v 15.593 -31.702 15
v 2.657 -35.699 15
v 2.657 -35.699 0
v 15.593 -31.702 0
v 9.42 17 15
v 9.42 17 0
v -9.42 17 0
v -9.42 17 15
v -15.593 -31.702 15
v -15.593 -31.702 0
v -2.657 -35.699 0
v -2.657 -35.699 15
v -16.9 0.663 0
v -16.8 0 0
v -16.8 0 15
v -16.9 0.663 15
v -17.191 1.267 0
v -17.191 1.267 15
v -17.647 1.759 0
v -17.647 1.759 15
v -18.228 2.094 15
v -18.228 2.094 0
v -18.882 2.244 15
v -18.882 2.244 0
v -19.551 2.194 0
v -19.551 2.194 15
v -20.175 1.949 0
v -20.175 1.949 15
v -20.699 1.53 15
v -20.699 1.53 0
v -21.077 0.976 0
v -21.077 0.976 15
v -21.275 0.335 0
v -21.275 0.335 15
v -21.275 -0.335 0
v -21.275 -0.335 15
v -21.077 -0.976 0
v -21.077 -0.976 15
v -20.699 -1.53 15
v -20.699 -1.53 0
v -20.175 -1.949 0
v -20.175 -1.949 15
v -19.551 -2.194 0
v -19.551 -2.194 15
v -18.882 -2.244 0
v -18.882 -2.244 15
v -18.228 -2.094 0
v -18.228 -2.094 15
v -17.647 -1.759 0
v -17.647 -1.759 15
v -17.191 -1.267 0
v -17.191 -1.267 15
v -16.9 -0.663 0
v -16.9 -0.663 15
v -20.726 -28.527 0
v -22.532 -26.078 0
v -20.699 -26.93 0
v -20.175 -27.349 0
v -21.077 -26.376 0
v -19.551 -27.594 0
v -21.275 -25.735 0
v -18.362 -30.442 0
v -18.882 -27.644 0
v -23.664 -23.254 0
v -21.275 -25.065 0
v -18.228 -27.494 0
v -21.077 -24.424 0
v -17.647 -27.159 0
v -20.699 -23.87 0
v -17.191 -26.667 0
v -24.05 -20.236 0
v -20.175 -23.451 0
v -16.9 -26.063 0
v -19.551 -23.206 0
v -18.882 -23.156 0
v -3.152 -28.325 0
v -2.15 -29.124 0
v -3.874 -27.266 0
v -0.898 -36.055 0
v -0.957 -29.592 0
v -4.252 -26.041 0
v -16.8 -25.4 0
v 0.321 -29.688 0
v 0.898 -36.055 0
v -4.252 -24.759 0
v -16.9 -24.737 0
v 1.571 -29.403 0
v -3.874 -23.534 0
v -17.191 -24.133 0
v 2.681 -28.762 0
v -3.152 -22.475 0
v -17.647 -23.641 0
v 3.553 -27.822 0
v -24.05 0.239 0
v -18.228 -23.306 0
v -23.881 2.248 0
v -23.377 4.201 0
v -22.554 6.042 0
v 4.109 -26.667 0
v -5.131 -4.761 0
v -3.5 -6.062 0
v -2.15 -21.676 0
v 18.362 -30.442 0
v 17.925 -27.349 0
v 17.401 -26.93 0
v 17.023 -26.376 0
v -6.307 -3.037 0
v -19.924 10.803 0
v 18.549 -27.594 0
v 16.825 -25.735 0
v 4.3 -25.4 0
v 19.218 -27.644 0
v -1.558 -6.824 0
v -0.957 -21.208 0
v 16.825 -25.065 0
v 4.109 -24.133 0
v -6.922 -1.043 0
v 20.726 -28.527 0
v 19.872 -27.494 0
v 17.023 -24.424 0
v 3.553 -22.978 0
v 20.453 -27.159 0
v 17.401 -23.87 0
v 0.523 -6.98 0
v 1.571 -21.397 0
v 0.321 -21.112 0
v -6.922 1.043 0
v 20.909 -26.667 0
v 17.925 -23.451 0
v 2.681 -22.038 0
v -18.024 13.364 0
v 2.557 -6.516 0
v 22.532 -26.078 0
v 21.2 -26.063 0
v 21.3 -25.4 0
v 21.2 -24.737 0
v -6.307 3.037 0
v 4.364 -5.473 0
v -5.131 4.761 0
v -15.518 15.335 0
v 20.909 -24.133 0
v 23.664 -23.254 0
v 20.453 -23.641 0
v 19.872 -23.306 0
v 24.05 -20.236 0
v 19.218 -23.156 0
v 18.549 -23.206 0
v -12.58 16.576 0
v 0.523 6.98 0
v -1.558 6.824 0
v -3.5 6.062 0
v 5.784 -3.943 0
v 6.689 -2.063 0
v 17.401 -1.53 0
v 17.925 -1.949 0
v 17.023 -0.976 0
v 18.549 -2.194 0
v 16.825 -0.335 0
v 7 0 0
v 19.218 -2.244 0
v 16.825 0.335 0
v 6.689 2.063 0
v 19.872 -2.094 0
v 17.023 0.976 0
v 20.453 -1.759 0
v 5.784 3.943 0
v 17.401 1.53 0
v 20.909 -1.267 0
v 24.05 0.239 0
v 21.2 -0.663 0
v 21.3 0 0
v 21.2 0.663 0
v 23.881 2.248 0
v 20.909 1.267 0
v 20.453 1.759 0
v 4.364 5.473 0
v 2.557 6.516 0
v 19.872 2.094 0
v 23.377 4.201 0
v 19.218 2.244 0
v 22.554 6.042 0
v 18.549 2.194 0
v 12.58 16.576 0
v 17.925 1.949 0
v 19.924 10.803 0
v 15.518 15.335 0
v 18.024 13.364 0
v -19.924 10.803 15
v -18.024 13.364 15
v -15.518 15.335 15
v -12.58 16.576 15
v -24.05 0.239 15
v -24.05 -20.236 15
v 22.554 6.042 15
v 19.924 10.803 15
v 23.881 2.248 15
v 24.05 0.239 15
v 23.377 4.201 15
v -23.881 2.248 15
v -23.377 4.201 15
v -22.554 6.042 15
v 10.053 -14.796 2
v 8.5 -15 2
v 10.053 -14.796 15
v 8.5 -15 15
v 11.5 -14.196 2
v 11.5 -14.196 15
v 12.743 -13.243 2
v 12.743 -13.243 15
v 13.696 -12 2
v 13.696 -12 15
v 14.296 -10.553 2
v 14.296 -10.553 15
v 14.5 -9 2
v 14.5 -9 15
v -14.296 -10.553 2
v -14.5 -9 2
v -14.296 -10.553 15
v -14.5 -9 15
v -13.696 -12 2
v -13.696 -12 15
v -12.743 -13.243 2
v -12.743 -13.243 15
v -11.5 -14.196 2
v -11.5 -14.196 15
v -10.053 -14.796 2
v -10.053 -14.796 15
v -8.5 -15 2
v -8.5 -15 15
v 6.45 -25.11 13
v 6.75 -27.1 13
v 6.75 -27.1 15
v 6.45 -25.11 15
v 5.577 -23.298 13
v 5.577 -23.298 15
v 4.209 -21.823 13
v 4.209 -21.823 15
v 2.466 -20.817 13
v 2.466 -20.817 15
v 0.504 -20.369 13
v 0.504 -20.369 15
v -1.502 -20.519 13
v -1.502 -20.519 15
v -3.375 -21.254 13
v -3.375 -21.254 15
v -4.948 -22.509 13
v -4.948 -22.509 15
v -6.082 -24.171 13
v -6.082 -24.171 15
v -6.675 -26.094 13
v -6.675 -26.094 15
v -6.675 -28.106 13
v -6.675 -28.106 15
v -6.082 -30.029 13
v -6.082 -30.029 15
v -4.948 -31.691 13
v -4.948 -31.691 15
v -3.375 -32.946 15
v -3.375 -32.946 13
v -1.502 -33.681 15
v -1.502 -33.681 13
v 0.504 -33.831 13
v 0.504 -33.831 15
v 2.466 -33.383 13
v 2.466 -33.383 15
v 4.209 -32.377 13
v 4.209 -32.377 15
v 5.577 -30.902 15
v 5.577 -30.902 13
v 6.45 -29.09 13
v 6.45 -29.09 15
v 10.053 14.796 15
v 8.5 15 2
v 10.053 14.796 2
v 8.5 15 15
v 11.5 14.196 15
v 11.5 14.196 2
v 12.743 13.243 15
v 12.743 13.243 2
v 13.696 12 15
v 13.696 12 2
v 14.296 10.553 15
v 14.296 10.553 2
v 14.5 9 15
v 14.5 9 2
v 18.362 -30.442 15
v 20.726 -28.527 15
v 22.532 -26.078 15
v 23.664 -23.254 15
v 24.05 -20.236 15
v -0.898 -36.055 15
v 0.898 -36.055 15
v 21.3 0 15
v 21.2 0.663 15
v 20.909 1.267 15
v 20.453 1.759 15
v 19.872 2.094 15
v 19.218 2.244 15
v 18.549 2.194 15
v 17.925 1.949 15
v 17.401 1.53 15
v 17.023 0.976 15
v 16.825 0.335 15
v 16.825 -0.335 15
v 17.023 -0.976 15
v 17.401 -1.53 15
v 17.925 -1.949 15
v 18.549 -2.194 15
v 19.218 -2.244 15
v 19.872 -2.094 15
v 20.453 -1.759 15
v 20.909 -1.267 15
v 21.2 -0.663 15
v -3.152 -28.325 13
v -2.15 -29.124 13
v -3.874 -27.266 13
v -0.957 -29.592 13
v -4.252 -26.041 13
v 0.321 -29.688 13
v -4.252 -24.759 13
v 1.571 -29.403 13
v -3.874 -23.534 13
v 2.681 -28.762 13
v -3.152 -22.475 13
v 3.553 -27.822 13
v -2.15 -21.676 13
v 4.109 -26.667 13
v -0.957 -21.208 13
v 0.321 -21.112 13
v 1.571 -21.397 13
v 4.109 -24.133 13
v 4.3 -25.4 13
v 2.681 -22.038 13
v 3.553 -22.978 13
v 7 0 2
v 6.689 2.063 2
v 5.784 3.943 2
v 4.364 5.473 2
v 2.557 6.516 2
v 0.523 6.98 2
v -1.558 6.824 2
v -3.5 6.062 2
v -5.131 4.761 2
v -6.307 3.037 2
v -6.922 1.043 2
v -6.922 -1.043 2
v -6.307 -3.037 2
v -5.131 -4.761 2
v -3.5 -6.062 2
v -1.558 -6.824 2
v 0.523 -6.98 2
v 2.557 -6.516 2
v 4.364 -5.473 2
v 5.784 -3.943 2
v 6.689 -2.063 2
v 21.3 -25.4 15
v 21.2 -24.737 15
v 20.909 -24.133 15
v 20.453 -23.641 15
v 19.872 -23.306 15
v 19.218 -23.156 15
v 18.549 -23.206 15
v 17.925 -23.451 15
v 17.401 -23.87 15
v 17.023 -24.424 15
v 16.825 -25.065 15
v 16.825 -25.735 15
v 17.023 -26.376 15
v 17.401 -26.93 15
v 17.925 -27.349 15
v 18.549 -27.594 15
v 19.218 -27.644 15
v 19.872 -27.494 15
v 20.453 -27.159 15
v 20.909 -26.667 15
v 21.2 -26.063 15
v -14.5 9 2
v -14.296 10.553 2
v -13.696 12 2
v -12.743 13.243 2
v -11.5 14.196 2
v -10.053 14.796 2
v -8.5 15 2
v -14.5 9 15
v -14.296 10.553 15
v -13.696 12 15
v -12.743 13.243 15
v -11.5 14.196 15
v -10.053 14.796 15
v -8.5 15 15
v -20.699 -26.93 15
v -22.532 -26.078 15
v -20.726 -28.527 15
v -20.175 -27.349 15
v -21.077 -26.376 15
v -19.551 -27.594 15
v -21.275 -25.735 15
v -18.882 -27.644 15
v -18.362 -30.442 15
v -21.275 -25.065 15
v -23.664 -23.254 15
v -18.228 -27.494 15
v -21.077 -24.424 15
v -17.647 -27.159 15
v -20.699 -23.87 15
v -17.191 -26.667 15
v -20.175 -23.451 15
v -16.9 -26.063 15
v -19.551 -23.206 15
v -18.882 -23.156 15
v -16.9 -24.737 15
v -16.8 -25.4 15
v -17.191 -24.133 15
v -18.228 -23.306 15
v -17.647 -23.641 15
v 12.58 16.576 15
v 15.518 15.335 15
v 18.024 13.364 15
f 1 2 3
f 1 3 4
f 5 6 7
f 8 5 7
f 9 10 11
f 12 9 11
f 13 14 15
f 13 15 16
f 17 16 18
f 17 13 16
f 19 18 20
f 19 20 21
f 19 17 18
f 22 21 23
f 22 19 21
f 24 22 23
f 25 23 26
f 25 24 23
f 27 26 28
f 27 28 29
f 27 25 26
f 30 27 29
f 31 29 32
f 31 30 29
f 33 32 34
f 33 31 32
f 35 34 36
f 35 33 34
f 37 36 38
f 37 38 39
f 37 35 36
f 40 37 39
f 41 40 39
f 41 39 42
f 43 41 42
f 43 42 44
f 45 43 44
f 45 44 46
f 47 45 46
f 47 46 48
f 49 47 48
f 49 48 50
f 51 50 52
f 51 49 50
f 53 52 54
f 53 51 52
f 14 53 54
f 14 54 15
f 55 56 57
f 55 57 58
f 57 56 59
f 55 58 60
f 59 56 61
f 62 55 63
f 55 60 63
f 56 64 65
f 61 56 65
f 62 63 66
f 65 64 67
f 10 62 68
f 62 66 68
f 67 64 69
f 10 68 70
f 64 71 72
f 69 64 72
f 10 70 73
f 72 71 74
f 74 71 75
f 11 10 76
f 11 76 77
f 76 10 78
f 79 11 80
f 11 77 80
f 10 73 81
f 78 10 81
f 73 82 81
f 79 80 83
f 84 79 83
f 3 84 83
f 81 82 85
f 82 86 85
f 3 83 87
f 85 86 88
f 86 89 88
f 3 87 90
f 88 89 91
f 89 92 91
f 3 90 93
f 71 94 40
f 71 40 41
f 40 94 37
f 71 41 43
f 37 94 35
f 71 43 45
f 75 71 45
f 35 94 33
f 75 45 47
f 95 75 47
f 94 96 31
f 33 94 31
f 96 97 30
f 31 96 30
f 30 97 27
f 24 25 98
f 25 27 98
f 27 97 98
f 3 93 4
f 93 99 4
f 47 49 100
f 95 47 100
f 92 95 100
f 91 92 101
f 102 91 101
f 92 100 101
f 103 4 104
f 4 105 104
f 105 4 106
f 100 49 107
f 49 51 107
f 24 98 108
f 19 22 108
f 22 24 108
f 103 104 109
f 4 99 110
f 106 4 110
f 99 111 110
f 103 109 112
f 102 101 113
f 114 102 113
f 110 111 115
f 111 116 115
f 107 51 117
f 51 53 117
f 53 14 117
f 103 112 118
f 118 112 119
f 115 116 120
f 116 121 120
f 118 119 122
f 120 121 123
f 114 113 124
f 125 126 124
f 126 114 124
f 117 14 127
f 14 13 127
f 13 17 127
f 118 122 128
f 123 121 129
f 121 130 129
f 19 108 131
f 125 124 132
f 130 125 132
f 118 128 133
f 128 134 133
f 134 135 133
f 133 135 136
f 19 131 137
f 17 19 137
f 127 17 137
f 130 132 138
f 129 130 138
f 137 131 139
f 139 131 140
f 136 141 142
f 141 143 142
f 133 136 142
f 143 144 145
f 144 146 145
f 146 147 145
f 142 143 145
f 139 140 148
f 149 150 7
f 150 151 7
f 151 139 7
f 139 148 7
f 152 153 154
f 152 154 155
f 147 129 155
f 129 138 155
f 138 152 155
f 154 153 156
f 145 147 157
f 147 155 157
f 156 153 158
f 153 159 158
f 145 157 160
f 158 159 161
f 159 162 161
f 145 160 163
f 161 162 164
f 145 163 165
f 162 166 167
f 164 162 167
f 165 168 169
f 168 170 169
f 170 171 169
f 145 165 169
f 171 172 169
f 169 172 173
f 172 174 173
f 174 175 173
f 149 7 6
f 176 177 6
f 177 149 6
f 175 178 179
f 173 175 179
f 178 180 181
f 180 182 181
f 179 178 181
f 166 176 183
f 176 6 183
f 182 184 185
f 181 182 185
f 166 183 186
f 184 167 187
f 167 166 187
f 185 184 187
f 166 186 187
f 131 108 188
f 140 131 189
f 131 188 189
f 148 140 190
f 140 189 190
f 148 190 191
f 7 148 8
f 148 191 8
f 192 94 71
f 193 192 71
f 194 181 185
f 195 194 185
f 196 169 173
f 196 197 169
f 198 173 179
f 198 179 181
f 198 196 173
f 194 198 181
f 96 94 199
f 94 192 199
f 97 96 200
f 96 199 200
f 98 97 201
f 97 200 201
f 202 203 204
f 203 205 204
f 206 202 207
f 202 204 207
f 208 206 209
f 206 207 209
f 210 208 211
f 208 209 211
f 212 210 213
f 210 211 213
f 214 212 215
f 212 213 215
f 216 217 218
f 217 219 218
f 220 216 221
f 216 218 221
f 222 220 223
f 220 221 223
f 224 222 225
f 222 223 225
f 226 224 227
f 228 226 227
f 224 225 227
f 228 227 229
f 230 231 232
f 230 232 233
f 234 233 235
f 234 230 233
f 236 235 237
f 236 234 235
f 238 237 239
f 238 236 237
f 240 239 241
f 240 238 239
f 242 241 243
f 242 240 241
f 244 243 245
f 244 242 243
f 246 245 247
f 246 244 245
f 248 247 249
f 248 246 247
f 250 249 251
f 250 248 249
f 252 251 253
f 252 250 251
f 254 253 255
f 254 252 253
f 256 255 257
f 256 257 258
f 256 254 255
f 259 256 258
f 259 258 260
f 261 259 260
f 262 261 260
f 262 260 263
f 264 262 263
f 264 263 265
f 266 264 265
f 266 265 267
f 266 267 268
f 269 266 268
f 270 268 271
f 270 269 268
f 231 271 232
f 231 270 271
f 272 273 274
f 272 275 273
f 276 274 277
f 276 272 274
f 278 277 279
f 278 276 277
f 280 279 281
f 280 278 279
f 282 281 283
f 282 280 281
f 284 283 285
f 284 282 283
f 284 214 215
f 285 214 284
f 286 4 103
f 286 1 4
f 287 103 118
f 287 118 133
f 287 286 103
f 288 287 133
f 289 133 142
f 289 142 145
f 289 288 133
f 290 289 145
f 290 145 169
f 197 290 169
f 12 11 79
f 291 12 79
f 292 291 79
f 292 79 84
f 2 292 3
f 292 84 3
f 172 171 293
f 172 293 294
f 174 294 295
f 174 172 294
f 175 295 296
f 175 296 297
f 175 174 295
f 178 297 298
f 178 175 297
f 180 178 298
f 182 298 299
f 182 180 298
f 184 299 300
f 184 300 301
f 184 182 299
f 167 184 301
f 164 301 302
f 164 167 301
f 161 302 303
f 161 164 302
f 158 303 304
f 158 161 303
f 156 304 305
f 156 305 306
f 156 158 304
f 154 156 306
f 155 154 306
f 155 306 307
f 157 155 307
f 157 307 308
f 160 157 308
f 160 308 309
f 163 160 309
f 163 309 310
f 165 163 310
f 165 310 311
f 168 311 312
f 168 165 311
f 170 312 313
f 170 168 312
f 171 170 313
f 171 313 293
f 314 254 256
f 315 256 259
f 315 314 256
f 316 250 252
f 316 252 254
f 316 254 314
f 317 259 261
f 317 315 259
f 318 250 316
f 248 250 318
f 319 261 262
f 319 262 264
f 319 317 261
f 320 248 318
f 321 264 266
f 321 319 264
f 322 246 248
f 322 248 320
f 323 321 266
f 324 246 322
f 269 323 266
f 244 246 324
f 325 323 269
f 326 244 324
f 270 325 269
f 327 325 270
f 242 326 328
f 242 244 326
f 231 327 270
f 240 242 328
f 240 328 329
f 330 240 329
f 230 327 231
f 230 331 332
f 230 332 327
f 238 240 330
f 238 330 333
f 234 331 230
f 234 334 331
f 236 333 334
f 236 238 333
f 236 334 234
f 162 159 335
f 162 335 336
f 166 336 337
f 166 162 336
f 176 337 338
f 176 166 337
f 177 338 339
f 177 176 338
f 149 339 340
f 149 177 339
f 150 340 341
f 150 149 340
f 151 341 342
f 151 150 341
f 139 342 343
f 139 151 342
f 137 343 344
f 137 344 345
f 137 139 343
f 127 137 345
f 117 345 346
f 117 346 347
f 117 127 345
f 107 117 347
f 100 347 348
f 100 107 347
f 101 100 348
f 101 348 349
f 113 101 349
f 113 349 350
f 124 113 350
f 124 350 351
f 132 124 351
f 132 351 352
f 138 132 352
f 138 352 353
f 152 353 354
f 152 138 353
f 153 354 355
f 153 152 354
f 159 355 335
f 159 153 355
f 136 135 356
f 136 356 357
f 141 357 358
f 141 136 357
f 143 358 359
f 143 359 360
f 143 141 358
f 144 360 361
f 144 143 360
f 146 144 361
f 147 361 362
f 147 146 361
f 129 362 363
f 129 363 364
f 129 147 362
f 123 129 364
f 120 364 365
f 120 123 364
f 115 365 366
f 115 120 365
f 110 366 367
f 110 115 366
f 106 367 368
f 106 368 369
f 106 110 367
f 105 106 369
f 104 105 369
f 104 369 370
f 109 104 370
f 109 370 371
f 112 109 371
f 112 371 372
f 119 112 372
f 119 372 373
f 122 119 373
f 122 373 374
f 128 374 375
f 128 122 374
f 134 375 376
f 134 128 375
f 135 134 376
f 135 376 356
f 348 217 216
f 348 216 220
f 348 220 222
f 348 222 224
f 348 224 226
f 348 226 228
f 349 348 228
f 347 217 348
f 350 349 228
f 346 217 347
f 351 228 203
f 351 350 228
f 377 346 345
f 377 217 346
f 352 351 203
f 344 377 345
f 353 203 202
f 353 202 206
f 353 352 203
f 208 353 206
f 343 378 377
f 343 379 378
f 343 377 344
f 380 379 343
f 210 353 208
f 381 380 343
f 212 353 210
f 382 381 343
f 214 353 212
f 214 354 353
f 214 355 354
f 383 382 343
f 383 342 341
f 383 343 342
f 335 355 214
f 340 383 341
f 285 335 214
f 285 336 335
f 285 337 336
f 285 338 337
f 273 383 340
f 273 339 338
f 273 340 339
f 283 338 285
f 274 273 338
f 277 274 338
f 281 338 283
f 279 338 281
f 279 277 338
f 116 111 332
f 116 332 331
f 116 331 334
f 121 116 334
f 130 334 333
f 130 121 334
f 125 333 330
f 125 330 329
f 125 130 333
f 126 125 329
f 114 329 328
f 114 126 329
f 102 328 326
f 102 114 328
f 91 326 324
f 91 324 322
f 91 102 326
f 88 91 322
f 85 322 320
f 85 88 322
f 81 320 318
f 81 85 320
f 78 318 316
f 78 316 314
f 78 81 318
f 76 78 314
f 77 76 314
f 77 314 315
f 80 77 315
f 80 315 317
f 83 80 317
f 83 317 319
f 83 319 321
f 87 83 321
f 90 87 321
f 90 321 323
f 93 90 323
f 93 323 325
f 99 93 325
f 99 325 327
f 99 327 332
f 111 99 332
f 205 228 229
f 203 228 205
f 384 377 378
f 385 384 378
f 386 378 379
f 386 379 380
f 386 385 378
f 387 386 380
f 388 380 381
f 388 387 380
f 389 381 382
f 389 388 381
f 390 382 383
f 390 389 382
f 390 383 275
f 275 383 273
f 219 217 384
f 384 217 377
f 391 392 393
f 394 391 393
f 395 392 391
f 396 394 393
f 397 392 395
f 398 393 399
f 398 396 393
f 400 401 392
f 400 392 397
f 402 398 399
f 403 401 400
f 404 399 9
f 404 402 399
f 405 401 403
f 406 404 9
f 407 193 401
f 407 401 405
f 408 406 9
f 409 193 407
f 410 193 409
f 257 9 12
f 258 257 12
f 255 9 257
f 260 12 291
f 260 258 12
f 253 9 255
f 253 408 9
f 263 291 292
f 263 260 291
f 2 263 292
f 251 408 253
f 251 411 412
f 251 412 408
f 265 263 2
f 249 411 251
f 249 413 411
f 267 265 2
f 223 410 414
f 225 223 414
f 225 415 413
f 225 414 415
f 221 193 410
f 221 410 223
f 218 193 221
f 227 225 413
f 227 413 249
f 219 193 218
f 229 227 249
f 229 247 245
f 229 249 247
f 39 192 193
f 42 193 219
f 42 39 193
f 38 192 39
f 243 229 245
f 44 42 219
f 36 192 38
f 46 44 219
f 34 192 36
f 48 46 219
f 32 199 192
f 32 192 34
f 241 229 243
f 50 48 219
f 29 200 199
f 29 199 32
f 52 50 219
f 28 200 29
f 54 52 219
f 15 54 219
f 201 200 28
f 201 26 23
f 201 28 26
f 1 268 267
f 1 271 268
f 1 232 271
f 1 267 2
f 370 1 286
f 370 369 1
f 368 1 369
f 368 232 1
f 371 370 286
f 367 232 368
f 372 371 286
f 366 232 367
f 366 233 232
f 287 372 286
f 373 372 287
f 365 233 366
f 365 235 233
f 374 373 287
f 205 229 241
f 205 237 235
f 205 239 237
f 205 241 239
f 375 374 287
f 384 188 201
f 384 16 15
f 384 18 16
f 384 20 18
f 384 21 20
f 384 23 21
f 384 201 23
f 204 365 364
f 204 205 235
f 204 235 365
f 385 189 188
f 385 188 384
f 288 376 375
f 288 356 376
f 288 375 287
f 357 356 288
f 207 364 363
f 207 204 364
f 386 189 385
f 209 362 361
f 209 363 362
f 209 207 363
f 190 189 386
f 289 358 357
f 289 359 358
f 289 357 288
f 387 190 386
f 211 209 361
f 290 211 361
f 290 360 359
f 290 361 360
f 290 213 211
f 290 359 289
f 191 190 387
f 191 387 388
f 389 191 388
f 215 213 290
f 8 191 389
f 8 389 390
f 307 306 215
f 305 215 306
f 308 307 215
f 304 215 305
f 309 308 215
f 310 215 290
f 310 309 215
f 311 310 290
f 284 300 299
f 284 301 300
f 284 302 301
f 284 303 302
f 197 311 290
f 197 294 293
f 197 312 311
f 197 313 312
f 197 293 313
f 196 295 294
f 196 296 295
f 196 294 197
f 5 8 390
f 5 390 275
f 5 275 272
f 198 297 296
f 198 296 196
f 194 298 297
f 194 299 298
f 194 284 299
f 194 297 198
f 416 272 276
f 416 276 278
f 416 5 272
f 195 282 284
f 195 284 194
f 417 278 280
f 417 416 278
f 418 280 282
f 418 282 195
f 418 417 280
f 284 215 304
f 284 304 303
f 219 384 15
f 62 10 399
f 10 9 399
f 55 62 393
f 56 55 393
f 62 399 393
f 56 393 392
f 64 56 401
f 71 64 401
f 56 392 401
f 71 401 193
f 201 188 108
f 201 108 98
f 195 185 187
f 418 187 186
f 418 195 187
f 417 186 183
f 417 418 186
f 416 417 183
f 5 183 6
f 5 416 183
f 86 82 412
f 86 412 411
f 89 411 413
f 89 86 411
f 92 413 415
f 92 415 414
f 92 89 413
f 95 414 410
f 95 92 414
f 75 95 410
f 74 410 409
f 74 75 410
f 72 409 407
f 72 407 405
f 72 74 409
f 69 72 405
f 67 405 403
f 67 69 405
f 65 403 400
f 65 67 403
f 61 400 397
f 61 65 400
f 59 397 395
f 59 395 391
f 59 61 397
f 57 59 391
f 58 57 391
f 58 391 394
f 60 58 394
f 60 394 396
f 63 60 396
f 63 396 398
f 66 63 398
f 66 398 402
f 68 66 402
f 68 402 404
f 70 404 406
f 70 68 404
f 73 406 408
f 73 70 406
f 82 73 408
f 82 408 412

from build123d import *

# Parameters (mm, degrees)
SKETCH3_R           = 2.25
SKETCH3_W           = 29
SKETCH3_H           = 30
SKETCH3_R_2         = 9
SKETCH3_R_3         = 6.75
SKETCH3_R_4         = 4.3
BOSS_EXTRUDE1_DEPTH = 15
SKETCH3_3_W         = 29
SKETCH3_3_H         = 30
SKETCH3_3_R         = 7
BOSS_EXTRUDE2_DEPTH = 2
CUT_EXTRUDE1_START  = 13
SKETCH3_4_R         = 6.75
SKETCH3_4_R_2       = 4.3
CUT_EXTRUDE1_DEPTH  = 2
FILLET1_R           = 6
FILLET2_R           = 12


with BuildPart() as part:
    # Sketch3 → Boss-Extrude1 (new body)
    # profile 1 of 3: a face of its own
    with BuildSketch(Plane.XY):
        with BuildLine():
            Line((16.5, 17), (-16.5, 17))
            Line((-16.5, 17), (-24.05, 3.333333333))
            Line((-24.05, 3.333333333), (-24.05, -29.088230031))
            Line((-24.05, -29.088230031), (-2.657112786, -35.698822689))
            ThreePointArc((-2.657112786, -35.698822689), (-5.342564222, -19.857278996), (9, -27.1))
            ThreePointArc((9, -27.1), (7.242721004, -32.442564222), (2.657112786, -35.698822689))
            Line((2.657112786, -35.698822689), (24.05, -29.088230031))
            Line((24.05, -29.088230031), (24.05, 3.333333333))
            Line((24.05, 3.333333333), (16.5, 17))
        make_face()
        with Locations((-19.05, -25.4)):
            Circle(SKETCH3_R, mode=Mode.SUBTRACT)
        with Locations((19.05, -25.4)):
            Circle(SKETCH3_R, mode=Mode.SUBTRACT)
        with Locations((-19.05, 0)):
            Circle(SKETCH3_R, mode=Mode.SUBTRACT)
        Rectangle(SKETCH3_W, SKETCH3_H, mode=Mode.SUBTRACT)
        with Locations((19.05, 0)):
            Circle(SKETCH3_R, mode=Mode.SUBTRACT)
    # profile 2 of 3: a face of its own
    with BuildSketch(Plane.XY):
        with Locations((0, -27.1)):
            Circle(SKETCH3_R_2)
        with Locations((0, -27.1)):
            Circle(SKETCH3_R_3, mode=Mode.SUBTRACT)
    # profile 3 of 3: a face of its own
    with BuildSketch(Plane.XY):
        with Locations((0, -27.1)):
            Circle(SKETCH3_R_3)
        with Locations((0, -25.4)):
            Circle(SKETCH3_R_4, mode=Mode.SUBTRACT)
    extrude(amount=BOSS_EXTRUDE1_DEPTH)

    # Sketch3<3> → Boss-Extrude2 (add)
    with BuildSketch(Plane.XY):
        Rectangle(SKETCH3_3_W, SKETCH3_3_H)
        Circle(SKETCH3_3_R, mode=Mode.SUBTRACT)
    extrude(amount=BOSS_EXTRUDE2_DEPTH)

    # Sketch3<4> → Cut-Extrude1 (cut)
    with BuildSketch(Plane.XY.offset(CUT_EXTRUDE1_START)):
        with Locations((0, -27.1)):
            Circle(SKETCH3_4_R)
        with Locations((0, -25.4)):
            Circle(SKETCH3_4_R_2, mode=Mode.SUBTRACT)
    extrude(amount=CUT_EXTRUDE1_DEPTH, mode=Mode.SUBTRACT)

    # Fillet1
    fillet1_edges = [part.edges().sort_by_distance(p)[0] for p in [
        (-14.5, 15, 8.5),
        (-14.5, -15, 8.5),
        (14.5, -15, 8.5),
        (14.5, 15, 8.5),
    ]]
    fillet(fillet1_edges, radius=FILLET1_R)

    # Fillet2
    fillet2_edges = [part.edges().sort_by_distance(p)[0] for p in [
        (-24.05, -29.088230031, 7.5),
        (-24.05, 3.333333333, 7.5),
        (-16.5, 17, 7.5),
        (16.5, 17, 7.5),
        (24.05, 3.333333333, 7.5),
        (24.05, -29.088230031, 7.5),
    ]]
    fillet(fillet2_edges, radius=FILLET2_R)


solid = part.part
